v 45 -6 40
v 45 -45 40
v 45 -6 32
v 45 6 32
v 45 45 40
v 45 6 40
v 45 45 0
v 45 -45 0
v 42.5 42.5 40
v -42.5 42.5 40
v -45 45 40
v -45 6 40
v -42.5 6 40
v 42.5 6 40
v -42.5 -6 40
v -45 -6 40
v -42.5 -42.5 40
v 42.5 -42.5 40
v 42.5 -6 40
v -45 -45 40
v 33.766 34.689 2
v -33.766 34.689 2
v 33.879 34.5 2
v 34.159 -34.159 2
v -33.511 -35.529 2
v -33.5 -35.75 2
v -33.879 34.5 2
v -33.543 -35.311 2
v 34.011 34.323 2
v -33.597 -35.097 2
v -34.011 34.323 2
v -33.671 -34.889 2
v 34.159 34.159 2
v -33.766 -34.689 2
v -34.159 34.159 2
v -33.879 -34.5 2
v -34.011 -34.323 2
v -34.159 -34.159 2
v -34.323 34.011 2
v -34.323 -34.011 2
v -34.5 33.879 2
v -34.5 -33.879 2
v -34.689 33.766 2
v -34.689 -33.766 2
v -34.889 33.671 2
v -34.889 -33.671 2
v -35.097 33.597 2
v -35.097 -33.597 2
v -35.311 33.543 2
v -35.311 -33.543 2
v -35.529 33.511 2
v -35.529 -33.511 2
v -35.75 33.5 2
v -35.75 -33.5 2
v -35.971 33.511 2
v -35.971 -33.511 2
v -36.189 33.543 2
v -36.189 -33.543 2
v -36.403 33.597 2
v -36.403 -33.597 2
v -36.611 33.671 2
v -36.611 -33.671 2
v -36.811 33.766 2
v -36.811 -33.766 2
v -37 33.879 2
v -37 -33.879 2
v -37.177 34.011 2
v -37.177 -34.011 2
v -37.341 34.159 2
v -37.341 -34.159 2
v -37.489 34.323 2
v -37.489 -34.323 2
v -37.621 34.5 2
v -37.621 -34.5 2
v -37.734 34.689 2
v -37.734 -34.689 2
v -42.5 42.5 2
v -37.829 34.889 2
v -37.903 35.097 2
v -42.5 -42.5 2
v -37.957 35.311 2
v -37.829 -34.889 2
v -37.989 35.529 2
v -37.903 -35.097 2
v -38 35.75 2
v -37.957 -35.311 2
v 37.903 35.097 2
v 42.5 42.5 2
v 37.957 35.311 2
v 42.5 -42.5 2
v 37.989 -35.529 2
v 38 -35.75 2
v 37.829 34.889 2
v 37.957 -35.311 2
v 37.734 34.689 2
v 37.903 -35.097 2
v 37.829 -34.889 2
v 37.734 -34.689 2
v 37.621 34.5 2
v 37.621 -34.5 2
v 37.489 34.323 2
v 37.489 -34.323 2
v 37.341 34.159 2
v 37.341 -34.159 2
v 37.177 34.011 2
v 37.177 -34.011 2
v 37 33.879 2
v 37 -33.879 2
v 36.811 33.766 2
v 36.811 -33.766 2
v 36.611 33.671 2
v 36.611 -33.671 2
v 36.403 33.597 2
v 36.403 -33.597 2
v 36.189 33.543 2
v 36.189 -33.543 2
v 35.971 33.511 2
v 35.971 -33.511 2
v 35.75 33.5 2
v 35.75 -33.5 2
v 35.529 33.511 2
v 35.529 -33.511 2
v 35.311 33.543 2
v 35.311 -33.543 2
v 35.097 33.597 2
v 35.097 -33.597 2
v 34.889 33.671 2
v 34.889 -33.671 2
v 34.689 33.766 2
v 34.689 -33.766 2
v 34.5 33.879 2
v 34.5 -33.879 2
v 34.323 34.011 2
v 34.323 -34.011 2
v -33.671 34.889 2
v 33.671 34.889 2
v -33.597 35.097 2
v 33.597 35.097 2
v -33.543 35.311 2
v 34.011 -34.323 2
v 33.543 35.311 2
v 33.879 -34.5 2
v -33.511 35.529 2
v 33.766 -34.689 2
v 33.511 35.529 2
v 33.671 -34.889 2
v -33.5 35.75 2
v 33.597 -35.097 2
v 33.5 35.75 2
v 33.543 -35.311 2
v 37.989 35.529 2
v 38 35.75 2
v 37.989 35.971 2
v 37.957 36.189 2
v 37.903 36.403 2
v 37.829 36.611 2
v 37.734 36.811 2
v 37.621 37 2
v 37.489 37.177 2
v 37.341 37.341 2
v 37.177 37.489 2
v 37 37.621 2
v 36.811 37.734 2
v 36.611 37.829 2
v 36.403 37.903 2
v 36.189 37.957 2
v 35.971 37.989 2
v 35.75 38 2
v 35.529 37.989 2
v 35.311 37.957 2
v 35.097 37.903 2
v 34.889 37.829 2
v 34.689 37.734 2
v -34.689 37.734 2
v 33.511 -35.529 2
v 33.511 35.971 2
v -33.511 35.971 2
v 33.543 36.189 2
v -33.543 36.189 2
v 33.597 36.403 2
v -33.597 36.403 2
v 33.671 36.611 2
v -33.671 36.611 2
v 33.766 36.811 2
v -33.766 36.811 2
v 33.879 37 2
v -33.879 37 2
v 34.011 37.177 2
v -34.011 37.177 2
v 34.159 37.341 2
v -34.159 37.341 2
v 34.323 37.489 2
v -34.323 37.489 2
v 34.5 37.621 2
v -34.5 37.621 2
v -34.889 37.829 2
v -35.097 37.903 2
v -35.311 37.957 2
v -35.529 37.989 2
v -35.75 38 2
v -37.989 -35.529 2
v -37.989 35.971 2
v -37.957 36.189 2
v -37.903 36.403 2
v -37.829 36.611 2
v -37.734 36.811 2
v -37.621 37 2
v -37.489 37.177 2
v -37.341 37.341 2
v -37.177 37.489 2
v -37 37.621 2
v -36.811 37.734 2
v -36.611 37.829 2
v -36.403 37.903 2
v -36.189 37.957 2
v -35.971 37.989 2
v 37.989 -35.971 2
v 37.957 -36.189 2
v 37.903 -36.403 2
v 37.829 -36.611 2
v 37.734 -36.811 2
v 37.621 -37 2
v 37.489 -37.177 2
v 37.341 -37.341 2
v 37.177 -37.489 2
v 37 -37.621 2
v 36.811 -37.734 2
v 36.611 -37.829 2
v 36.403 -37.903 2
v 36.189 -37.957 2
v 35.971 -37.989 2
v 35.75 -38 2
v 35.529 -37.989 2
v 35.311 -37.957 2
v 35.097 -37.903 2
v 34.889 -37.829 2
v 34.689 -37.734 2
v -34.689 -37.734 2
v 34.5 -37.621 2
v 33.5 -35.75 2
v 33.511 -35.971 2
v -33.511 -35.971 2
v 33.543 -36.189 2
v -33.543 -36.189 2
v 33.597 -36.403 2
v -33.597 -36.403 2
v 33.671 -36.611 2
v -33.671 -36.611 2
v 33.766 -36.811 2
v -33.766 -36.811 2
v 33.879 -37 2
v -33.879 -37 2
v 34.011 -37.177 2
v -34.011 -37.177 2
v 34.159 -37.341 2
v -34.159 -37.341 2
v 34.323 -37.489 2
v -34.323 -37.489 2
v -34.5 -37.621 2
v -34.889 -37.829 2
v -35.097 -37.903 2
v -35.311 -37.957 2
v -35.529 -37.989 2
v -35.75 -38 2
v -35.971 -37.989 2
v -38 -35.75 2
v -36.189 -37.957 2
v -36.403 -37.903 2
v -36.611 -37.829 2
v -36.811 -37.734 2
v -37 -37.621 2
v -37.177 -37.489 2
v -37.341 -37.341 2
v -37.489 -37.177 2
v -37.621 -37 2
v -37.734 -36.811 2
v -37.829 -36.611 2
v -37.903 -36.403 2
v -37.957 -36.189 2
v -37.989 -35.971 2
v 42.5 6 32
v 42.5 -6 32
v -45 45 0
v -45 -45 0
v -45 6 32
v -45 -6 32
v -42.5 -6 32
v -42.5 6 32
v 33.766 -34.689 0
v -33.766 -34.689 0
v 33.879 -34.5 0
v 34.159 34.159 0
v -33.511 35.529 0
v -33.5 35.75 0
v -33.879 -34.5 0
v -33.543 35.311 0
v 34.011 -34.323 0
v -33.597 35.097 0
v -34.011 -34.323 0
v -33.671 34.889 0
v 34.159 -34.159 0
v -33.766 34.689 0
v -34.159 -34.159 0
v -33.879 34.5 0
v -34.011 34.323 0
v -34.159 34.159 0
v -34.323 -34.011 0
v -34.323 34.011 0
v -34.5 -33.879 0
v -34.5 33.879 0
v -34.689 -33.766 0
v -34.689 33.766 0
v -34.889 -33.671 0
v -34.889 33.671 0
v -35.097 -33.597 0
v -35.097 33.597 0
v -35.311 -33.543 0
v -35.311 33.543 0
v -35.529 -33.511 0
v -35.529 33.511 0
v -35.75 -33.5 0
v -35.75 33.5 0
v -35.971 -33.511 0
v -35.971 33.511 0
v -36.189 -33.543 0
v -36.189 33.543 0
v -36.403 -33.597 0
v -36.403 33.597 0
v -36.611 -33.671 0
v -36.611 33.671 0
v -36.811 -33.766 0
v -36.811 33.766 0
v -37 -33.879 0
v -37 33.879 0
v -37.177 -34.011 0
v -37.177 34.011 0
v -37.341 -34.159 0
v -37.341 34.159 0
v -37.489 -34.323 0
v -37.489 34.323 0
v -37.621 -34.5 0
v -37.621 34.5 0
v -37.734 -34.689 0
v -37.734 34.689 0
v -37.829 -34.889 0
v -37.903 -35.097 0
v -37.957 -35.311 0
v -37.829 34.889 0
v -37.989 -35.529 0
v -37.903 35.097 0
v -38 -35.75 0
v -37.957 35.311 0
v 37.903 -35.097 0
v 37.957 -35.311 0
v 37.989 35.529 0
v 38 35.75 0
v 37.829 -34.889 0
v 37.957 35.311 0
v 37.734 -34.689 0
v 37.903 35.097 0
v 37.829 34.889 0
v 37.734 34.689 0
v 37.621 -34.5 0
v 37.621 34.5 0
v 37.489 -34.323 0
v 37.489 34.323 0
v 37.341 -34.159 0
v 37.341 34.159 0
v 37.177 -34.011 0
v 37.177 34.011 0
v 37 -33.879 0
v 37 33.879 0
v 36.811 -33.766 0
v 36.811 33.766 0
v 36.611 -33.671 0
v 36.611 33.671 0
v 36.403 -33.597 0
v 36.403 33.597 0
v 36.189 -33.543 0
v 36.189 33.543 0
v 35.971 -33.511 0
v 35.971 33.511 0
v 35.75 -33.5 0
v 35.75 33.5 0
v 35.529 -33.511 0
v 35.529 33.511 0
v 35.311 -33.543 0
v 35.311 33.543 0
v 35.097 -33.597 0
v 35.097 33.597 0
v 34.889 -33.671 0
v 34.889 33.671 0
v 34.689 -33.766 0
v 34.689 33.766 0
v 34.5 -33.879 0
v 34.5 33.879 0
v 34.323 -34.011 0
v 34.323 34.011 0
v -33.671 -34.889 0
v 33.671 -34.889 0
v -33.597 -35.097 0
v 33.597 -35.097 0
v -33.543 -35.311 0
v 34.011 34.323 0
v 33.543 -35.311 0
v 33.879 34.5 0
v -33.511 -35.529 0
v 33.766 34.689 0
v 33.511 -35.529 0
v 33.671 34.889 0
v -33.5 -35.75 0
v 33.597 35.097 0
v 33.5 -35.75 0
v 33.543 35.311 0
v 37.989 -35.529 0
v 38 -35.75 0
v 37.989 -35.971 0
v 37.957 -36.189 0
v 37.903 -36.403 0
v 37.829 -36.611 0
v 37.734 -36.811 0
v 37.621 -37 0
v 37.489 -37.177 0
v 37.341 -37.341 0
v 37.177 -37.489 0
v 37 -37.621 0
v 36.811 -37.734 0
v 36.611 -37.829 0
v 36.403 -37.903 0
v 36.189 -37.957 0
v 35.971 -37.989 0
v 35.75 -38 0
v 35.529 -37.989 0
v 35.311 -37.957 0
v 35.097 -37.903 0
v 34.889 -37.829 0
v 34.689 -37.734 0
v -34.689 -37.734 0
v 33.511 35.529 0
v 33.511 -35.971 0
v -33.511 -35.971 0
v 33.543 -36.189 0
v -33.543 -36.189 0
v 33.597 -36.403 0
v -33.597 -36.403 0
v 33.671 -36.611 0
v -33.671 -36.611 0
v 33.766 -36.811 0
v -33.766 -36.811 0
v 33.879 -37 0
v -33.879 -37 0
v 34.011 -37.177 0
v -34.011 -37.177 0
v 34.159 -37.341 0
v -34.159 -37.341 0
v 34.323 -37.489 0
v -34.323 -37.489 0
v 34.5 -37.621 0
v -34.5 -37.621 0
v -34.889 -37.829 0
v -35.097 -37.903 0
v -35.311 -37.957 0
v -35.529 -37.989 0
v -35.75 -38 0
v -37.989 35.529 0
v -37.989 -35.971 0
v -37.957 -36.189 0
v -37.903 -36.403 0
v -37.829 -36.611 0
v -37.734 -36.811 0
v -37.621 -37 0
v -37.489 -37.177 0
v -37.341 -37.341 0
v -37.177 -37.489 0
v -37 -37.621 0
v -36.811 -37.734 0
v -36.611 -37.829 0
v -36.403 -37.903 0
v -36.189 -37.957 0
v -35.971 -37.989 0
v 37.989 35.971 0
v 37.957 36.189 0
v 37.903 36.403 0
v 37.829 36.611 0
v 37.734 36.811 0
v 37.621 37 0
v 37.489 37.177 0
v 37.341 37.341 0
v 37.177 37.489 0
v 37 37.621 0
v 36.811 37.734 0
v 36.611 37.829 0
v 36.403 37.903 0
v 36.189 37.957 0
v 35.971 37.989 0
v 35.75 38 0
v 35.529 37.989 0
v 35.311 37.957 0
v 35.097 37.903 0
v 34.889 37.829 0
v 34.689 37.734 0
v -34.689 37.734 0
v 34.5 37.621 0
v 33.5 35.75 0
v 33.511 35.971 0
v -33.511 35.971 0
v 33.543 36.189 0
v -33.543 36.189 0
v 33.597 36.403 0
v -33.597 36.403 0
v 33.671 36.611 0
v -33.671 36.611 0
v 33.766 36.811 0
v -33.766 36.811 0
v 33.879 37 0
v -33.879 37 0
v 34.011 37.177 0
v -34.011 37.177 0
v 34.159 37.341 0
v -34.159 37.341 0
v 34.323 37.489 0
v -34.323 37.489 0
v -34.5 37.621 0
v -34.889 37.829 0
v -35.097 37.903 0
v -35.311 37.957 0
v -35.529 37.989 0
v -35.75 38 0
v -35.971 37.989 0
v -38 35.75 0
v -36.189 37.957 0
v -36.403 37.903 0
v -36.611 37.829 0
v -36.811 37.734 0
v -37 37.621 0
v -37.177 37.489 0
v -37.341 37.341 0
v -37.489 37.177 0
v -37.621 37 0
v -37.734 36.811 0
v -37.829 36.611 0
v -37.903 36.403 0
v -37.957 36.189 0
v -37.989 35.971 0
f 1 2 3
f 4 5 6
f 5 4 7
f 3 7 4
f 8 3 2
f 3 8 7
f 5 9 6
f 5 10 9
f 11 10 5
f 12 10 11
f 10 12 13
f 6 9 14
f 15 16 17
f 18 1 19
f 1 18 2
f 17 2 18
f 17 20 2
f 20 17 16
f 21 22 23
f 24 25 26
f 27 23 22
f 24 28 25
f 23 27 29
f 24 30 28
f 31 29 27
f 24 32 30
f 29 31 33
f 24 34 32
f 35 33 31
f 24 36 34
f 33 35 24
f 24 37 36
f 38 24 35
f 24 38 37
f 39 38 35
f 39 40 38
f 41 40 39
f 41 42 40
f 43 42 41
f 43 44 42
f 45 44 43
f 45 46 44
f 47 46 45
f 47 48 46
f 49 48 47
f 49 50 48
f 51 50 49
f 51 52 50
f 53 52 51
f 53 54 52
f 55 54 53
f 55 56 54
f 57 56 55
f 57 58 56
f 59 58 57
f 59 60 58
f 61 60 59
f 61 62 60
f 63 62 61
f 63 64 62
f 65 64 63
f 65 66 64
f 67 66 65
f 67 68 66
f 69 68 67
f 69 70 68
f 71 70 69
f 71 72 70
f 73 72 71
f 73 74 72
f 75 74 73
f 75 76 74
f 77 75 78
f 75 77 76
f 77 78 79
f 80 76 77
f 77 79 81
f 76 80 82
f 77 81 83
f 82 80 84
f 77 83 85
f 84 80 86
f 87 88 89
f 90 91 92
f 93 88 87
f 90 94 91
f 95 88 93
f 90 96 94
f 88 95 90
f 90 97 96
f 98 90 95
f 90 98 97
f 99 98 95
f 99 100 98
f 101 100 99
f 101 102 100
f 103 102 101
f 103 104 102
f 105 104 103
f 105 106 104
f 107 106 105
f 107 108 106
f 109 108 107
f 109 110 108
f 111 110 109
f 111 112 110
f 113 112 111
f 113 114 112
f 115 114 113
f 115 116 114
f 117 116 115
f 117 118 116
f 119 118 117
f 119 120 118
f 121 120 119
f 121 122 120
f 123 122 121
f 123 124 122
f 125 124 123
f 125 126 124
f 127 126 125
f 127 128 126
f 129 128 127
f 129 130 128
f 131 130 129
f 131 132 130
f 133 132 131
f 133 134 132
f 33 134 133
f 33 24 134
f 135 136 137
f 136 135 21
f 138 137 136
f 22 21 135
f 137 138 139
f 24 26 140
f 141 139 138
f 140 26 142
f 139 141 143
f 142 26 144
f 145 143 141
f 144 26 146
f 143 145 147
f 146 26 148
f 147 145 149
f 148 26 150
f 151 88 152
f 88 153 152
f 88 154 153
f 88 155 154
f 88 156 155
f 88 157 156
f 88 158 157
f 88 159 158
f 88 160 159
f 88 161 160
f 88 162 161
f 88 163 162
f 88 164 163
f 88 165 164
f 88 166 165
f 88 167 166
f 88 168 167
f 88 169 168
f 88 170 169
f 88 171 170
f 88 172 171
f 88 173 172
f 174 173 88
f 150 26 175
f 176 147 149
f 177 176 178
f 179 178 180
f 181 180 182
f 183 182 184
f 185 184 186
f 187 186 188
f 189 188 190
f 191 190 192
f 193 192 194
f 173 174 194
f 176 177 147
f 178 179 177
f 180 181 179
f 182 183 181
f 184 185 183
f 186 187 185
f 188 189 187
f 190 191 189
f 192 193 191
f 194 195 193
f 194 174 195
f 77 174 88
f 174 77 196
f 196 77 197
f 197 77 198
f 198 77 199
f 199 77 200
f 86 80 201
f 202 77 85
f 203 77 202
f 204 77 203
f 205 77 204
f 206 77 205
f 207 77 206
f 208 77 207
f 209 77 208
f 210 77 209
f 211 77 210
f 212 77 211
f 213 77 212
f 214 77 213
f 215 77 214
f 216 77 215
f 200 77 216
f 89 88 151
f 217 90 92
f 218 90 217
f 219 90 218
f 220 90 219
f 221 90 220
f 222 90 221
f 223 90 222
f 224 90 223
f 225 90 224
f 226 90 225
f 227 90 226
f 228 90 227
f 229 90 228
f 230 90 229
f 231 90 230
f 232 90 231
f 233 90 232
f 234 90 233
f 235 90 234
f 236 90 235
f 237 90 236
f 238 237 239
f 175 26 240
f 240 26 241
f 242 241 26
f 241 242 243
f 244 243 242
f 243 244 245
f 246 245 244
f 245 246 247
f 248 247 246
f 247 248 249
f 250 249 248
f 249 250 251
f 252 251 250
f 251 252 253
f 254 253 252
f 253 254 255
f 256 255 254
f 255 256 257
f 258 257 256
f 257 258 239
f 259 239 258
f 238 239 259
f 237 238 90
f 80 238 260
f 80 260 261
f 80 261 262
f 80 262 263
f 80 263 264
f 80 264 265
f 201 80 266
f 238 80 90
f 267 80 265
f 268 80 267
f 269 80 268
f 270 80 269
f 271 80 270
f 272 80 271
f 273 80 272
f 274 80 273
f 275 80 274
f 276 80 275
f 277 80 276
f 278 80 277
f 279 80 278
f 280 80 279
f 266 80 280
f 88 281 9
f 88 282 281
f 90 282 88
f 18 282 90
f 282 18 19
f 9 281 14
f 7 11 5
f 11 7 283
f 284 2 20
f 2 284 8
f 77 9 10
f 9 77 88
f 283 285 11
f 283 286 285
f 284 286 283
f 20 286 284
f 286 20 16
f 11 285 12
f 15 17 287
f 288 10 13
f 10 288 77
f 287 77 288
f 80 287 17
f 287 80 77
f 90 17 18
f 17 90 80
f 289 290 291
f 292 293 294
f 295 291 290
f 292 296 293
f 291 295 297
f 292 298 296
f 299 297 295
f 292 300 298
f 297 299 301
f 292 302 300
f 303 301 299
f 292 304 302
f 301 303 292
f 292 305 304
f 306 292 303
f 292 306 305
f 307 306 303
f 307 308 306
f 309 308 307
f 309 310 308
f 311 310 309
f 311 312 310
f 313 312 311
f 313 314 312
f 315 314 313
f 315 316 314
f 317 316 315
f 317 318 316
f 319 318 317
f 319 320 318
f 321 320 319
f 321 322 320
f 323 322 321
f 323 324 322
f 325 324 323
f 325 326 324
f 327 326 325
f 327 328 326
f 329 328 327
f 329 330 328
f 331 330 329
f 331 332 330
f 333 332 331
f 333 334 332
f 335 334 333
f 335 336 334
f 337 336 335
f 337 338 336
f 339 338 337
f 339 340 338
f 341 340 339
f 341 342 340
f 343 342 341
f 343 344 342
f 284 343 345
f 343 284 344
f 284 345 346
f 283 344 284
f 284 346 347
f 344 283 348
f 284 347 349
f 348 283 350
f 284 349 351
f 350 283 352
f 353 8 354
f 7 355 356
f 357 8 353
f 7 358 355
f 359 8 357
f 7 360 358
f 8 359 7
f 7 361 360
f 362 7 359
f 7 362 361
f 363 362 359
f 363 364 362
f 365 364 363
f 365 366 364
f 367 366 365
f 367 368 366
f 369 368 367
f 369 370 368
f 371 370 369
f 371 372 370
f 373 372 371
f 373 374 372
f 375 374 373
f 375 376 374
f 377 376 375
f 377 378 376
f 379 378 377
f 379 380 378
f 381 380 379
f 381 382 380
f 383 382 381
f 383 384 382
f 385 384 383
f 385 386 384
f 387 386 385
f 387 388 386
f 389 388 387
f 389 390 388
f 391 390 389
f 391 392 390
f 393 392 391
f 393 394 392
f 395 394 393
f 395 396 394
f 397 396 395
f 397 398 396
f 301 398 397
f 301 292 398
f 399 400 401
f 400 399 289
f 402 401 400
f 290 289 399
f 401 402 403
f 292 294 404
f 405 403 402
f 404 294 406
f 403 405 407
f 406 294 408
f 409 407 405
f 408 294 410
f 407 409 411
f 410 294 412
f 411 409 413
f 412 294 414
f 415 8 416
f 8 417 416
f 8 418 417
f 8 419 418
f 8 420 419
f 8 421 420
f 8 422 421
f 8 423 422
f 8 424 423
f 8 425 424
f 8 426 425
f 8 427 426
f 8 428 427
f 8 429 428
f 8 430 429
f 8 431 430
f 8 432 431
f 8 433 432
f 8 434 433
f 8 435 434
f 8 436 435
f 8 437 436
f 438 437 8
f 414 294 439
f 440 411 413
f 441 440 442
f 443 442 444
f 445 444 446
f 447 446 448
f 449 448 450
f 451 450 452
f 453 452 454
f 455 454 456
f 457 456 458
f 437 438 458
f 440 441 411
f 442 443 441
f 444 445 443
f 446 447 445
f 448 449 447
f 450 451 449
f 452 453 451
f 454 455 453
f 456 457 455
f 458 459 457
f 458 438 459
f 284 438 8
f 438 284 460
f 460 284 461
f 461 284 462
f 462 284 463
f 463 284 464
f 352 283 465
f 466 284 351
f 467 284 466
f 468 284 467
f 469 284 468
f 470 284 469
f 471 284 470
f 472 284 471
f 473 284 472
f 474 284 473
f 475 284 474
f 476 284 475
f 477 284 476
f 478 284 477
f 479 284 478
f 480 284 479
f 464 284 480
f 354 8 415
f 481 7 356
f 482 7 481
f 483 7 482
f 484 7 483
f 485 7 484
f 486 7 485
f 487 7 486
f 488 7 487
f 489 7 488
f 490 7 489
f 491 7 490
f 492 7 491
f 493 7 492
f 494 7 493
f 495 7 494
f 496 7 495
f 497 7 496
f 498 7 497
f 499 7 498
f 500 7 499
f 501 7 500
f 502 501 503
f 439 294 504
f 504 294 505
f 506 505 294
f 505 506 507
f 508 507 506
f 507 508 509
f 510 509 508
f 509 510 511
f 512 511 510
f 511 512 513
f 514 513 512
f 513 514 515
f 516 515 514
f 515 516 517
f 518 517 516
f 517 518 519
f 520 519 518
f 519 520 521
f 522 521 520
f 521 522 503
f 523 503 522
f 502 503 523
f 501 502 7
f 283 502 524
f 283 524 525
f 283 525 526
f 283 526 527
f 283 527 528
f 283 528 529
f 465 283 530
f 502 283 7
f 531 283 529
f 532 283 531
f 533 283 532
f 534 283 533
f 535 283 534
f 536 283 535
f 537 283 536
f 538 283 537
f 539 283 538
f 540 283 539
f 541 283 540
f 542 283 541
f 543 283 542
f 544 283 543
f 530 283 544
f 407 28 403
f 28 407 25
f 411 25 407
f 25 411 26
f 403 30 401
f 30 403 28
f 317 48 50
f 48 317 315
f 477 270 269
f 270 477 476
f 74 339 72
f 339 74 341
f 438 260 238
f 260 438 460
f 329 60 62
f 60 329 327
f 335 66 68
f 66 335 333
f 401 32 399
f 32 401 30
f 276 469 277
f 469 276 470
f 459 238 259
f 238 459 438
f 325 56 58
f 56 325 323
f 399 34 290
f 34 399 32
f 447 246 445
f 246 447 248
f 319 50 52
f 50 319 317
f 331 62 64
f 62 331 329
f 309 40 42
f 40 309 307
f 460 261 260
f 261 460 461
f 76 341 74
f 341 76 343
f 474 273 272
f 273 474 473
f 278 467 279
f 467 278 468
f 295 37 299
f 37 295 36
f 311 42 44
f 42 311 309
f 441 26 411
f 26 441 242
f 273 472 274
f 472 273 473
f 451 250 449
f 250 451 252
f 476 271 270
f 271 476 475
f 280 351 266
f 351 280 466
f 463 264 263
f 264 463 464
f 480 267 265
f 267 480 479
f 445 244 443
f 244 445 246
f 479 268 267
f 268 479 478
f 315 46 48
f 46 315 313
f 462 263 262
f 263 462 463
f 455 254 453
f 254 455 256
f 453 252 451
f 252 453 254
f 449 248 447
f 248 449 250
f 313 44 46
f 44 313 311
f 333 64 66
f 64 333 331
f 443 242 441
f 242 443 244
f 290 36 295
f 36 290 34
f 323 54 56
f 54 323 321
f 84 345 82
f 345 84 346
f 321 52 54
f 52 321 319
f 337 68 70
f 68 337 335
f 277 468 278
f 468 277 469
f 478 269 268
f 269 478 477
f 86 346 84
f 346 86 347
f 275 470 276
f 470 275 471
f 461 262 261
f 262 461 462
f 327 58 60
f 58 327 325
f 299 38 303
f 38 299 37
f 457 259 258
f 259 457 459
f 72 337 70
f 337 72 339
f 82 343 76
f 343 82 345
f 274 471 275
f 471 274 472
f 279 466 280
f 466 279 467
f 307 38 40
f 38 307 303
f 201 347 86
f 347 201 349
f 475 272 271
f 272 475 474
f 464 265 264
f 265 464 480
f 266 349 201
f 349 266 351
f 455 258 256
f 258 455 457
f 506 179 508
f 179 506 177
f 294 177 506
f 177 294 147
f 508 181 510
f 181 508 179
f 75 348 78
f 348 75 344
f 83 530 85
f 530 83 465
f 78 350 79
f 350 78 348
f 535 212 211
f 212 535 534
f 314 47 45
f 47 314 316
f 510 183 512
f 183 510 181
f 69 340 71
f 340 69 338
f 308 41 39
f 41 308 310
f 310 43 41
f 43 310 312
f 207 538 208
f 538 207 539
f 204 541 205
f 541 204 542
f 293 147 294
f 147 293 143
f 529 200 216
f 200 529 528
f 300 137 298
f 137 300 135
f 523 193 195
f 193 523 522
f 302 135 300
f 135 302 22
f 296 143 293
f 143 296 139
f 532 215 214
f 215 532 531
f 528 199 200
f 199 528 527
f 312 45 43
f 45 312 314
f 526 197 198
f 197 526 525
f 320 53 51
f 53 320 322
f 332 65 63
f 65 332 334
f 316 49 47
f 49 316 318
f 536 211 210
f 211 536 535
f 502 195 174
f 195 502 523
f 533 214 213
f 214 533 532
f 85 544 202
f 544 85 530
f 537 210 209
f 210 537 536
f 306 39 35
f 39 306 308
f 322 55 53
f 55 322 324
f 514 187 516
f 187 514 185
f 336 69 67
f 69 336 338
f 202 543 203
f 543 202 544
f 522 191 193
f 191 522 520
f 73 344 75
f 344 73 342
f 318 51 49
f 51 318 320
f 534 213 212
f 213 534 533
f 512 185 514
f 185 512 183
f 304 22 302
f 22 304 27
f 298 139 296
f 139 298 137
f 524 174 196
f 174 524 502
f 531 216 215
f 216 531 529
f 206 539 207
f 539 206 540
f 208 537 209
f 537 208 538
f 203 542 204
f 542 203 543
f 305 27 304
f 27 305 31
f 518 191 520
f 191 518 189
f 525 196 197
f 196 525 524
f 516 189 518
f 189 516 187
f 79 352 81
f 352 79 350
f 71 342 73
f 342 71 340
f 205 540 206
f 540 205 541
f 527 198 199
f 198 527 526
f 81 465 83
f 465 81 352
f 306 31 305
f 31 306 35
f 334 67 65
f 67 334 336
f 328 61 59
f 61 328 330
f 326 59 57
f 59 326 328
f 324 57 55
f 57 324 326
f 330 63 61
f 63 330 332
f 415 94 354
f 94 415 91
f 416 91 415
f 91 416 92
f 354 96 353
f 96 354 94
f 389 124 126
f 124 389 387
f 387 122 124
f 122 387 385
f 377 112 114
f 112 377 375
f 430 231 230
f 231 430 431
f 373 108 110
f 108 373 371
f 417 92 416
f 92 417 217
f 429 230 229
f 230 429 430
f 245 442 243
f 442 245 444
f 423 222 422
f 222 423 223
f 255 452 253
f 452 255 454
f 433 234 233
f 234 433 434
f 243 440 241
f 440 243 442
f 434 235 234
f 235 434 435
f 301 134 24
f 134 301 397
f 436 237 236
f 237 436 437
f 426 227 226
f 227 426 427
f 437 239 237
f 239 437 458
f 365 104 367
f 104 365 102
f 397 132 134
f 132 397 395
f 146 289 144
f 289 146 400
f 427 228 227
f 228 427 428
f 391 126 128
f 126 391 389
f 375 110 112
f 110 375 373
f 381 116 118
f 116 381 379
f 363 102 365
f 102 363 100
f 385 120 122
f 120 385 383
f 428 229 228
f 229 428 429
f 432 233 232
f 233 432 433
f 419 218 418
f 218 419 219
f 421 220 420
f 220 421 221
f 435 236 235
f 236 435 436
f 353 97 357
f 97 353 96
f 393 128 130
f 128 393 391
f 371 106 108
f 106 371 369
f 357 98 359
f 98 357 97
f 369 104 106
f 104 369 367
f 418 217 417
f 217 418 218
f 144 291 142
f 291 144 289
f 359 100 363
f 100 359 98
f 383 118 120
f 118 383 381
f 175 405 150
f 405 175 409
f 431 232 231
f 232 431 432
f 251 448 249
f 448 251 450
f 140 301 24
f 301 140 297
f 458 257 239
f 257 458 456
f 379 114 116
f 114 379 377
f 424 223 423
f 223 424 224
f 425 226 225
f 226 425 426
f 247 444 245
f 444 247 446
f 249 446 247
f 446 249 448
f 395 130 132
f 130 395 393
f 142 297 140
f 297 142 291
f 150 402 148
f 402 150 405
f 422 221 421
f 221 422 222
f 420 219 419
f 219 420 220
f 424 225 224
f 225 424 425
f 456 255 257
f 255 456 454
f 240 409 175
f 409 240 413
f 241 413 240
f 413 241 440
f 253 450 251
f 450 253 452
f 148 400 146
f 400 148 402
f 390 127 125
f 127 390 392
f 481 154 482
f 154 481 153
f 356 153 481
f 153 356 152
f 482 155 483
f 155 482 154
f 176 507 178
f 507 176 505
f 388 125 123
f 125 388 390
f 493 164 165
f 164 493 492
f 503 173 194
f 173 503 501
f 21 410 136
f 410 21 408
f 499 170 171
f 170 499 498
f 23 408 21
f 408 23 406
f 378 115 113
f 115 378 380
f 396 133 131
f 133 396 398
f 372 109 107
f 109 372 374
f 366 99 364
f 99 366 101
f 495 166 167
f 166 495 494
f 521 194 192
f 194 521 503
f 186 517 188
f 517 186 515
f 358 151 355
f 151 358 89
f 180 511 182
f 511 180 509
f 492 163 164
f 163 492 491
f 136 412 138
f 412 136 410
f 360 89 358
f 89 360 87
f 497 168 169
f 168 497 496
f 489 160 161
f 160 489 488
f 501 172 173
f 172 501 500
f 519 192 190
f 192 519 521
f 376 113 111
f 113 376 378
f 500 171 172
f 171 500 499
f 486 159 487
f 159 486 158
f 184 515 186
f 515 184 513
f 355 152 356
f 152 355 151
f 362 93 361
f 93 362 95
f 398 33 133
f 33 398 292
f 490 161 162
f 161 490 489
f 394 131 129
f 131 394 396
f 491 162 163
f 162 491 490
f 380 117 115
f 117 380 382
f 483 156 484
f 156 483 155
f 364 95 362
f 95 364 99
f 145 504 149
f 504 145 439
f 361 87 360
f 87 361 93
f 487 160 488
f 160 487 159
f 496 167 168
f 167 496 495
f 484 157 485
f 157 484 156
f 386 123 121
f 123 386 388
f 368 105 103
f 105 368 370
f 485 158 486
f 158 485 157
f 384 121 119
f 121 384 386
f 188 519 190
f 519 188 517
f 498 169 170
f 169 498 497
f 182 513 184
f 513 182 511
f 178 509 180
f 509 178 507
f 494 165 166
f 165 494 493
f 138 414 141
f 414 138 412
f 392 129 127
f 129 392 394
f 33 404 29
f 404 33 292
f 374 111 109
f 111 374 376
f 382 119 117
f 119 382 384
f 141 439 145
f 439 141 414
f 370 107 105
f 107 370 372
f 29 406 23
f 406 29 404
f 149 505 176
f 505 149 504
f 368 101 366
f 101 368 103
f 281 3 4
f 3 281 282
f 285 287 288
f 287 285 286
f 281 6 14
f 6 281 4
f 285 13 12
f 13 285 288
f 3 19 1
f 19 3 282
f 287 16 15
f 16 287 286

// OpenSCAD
// Magnetic stirrer housing for 80 mm PC case fan
// Print orientation: top plate on bed (z = 0), walls rise to open top (z = 40)

// ---------- Parameters ----------
plate_t      = 2;     // top plate thickness
wall_t       = 2.5;   // wall thickness
open_top_z   = 40;    // height of open top
outer_size   = 90;    // outer X/Y size of box
screw_hole   = 4.5;   // M4 screw hole diameter
screw_pitch  = 71.5;  // square pattern size for screw holes
cable_notch_w = 12;   // cable notch width
cable_notch_d = 8;    // cable notch depth from open edge
eps          = 0.5;   // cutter overshoot past faces

$fn = 64;

// ---------- Model ----------
difference() {
    // Main box body
    union() {
        // Top plate
        translate([-outer_size/2, -outer_size/2, 0])
            cube([outer_size, outer_size, plate_t]);
        // Walls
        for (a = [0, 90, 180, 270])
            rotate([0, 0, a])
                translate([outer_size/2 - wall_t, -outer_size/2, plate_t])
                    cube([wall_t, outer_size, open_top_z - plate_t]);
    }

    // Screw holes through top plate
    for (x = [-screw_pitch/2, screw_pitch/2])
        for (y = [-screw_pitch/2, screw_pitch/2])
            translate([x, y, -eps])
                cylinder(d = screw_hole, h = plate_t + 2*eps);

    // Cable notch in one wall (centred along Y, from z = 32 to z = 40)
    translate([-outer_size/2, -cable_notch_w/2, open_top_z - cable_notch_d])
        cube([outer_size, cable_notch_w, cable_notch_d + eps]);
}
